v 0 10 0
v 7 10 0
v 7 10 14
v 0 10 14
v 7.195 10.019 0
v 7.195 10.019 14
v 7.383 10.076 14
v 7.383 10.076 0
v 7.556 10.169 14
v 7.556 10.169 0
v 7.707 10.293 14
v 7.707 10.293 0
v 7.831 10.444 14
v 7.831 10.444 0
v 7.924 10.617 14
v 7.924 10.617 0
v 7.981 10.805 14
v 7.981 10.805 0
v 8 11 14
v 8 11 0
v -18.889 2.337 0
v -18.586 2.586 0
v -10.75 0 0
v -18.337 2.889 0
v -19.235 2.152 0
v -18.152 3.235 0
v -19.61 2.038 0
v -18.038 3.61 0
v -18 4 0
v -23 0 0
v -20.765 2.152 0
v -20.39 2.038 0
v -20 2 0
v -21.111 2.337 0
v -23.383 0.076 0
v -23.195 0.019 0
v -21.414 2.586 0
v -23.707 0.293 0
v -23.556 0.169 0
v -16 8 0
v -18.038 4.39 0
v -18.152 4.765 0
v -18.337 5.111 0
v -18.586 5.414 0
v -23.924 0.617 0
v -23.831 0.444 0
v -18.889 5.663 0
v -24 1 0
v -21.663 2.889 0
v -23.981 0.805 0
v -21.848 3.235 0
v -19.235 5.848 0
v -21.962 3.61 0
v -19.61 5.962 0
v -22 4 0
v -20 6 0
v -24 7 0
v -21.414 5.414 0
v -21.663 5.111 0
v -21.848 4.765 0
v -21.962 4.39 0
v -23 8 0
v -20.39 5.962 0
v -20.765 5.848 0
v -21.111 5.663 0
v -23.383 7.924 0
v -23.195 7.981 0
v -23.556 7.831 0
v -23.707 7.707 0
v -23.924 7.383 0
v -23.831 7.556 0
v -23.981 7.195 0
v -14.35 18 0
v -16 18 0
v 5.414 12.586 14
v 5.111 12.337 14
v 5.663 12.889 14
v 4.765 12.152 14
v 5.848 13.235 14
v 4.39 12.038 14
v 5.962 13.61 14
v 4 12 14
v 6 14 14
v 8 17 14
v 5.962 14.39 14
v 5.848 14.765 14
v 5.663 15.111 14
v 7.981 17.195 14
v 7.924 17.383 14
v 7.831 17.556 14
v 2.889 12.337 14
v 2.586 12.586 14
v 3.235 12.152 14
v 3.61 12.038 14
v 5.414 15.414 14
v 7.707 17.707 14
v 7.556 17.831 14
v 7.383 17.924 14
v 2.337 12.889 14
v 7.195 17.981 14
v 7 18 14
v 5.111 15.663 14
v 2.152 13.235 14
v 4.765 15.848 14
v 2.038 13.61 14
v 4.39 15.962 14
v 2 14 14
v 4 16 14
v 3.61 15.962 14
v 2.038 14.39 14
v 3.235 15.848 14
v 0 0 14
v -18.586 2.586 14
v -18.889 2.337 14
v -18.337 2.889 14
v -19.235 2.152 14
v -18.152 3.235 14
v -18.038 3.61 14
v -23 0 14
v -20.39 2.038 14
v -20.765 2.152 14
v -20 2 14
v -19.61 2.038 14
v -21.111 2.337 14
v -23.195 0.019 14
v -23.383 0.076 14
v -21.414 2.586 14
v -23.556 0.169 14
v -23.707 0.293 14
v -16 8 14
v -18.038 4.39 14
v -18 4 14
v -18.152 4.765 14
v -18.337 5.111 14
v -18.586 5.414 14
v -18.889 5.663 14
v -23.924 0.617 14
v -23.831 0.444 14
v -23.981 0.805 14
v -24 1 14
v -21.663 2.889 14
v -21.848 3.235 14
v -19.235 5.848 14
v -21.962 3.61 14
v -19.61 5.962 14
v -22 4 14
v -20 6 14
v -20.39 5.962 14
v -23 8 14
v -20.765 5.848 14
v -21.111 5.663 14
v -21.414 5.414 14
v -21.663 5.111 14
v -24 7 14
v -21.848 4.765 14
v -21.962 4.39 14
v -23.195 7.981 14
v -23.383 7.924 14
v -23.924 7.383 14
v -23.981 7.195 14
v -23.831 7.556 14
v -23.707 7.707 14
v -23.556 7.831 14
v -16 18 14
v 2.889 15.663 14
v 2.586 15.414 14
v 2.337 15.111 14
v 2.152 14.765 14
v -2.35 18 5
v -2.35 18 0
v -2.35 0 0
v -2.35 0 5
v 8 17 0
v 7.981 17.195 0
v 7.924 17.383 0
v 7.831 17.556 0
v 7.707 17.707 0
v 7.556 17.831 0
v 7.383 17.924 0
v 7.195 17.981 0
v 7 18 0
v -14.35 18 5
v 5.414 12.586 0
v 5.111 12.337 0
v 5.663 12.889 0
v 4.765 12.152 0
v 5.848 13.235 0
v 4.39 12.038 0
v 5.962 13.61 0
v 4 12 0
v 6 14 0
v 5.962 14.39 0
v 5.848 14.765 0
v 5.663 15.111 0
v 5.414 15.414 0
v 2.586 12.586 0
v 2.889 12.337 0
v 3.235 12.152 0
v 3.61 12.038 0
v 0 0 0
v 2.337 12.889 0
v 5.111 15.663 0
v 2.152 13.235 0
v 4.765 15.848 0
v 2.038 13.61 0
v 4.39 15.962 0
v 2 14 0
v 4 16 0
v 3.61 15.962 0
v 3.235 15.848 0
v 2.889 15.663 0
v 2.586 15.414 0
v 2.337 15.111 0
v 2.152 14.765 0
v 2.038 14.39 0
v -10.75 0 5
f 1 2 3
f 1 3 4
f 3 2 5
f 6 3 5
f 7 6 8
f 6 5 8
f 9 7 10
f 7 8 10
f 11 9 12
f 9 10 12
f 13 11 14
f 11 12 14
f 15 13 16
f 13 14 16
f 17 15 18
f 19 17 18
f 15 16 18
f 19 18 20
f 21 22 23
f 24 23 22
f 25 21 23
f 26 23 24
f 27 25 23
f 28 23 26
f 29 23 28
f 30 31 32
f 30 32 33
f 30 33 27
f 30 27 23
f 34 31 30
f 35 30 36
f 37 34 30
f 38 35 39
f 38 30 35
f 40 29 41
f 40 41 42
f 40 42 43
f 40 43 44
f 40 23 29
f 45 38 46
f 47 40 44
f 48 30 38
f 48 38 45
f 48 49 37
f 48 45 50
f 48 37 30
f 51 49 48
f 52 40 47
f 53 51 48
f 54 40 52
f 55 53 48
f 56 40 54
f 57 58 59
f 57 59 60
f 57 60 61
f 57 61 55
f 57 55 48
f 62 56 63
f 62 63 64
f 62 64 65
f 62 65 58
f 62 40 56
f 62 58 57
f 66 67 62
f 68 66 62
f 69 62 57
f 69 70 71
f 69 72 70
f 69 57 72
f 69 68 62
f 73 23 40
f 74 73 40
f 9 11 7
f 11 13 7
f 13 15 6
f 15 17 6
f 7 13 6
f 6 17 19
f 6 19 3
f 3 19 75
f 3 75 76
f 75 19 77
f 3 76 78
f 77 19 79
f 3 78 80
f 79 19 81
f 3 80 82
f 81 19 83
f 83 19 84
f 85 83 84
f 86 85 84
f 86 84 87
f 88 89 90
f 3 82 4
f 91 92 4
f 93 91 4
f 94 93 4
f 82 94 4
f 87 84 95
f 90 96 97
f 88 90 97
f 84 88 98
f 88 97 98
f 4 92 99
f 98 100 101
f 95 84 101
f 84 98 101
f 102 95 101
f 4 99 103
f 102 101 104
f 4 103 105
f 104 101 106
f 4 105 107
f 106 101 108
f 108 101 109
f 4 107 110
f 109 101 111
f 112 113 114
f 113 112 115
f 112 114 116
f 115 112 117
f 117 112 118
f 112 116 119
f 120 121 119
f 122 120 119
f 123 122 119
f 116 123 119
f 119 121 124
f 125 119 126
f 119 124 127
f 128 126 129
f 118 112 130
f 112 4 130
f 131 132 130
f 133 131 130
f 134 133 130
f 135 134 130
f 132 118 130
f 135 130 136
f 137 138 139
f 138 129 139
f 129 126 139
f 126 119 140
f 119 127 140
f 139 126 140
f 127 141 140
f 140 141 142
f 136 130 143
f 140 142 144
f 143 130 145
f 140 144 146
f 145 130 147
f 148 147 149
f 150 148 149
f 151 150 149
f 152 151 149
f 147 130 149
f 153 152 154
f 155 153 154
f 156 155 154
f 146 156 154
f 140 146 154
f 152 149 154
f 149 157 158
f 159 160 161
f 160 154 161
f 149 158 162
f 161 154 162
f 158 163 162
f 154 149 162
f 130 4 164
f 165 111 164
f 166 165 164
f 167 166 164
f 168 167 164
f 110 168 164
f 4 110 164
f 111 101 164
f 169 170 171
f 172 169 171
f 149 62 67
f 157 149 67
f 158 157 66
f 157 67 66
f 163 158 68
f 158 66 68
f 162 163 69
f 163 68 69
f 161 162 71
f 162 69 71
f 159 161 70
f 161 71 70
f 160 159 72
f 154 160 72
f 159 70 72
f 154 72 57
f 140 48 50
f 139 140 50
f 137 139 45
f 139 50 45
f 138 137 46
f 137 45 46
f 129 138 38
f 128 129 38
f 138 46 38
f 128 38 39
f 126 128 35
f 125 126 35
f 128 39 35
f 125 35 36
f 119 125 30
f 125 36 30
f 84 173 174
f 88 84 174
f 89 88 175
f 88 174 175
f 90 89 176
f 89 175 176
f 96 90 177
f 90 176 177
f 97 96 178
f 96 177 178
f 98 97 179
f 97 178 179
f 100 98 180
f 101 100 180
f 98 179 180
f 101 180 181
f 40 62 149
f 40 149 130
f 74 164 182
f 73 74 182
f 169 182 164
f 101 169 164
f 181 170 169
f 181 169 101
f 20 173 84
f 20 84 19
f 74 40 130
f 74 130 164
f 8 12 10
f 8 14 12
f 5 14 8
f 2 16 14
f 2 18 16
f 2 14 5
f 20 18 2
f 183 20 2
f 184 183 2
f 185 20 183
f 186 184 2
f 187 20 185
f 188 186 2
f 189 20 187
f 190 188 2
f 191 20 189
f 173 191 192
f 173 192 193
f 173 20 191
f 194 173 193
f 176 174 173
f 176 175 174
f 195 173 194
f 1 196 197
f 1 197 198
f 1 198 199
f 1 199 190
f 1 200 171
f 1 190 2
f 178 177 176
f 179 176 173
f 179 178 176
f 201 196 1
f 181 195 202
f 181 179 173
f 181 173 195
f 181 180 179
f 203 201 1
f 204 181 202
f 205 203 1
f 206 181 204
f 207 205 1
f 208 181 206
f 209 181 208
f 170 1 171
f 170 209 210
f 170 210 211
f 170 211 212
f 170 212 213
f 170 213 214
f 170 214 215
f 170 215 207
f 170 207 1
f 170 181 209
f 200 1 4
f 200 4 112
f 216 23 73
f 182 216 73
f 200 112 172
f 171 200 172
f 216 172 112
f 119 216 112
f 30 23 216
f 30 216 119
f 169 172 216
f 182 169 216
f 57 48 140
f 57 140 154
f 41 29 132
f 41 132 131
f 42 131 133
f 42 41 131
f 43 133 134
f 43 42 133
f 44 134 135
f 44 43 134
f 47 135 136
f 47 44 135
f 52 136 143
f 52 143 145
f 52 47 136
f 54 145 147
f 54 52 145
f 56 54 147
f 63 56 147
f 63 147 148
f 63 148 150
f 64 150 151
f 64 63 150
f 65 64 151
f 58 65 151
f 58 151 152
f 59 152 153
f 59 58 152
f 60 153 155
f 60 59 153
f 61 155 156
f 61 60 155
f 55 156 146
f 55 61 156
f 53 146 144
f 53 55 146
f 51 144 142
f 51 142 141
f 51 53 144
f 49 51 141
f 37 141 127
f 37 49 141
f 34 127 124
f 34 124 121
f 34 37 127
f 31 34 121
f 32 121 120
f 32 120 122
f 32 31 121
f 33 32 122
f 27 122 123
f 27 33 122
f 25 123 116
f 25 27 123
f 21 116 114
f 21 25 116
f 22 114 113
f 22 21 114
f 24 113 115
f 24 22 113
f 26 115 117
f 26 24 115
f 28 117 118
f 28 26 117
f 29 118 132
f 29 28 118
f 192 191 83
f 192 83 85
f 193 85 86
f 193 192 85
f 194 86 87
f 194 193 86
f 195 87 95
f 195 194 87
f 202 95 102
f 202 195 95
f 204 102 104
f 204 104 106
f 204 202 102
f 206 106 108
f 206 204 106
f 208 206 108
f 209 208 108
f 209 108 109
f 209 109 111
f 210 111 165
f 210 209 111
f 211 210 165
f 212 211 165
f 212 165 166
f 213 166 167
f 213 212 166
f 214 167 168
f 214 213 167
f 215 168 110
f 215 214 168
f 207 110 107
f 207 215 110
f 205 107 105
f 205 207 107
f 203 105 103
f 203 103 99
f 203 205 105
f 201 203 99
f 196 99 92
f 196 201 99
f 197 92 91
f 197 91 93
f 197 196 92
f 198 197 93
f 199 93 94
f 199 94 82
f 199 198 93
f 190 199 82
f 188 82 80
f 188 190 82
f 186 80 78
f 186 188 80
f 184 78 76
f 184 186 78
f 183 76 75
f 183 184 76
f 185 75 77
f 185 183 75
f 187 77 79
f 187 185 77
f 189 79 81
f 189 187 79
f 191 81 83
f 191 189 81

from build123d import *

# Parameters (mm, degrees)
SKETCH_R     = 2
PAD_DEPTH    = 14
POCKET_DEPTH = 5


with BuildPart() as part:
    # Sketch → Pad (new body)
    with BuildSketch(Plane.XY):
        with BuildLine():
            Line((-16, 18), (7, 18))
            ThreePointArc((8, 17), (7.707107, 17.707107), (7, 18))
            Line((8, 17), (8, 11))
            ThreePointArc((7, 10), (7.707107, 10.292893), (8, 11))
            Line((7, 10), (0, 10))
            Line((0, 10), (0, 0))
            Line((0, 0), (-23, 0))
            ThreePointArc((-24, 1), (-23.707107, 0.292893), (-23, 0))
            Line((-24, 1), (-24, 7))
            ThreePointArc((-23, 8), (-23.707107, 7.707107), (-24, 7))
            Line((-23, 8), (-16, 8))
            Line((-16, 8), (-16, 18))
        make_face()
        with Locations((4, 14)):
            Circle(SKETCH_R, mode=Mode.SUBTRACT)
        with Locations((-20, 4)):
            Circle(SKETCH_R, mode=Mode.SUBTRACT)
    extrude(amount=PAD_DEPTH)

    # Sketch001 → Pocket (cut)
    with BuildSketch(Plane.XY):
        Polygon((-2.35, 18), (-2.35, 0), (-10.75, 0), (-14.35, 18), align=None)
    extrude(amount=POCKET_DEPTH, mode=Mode.SUBTRACT)


solid = part.part
